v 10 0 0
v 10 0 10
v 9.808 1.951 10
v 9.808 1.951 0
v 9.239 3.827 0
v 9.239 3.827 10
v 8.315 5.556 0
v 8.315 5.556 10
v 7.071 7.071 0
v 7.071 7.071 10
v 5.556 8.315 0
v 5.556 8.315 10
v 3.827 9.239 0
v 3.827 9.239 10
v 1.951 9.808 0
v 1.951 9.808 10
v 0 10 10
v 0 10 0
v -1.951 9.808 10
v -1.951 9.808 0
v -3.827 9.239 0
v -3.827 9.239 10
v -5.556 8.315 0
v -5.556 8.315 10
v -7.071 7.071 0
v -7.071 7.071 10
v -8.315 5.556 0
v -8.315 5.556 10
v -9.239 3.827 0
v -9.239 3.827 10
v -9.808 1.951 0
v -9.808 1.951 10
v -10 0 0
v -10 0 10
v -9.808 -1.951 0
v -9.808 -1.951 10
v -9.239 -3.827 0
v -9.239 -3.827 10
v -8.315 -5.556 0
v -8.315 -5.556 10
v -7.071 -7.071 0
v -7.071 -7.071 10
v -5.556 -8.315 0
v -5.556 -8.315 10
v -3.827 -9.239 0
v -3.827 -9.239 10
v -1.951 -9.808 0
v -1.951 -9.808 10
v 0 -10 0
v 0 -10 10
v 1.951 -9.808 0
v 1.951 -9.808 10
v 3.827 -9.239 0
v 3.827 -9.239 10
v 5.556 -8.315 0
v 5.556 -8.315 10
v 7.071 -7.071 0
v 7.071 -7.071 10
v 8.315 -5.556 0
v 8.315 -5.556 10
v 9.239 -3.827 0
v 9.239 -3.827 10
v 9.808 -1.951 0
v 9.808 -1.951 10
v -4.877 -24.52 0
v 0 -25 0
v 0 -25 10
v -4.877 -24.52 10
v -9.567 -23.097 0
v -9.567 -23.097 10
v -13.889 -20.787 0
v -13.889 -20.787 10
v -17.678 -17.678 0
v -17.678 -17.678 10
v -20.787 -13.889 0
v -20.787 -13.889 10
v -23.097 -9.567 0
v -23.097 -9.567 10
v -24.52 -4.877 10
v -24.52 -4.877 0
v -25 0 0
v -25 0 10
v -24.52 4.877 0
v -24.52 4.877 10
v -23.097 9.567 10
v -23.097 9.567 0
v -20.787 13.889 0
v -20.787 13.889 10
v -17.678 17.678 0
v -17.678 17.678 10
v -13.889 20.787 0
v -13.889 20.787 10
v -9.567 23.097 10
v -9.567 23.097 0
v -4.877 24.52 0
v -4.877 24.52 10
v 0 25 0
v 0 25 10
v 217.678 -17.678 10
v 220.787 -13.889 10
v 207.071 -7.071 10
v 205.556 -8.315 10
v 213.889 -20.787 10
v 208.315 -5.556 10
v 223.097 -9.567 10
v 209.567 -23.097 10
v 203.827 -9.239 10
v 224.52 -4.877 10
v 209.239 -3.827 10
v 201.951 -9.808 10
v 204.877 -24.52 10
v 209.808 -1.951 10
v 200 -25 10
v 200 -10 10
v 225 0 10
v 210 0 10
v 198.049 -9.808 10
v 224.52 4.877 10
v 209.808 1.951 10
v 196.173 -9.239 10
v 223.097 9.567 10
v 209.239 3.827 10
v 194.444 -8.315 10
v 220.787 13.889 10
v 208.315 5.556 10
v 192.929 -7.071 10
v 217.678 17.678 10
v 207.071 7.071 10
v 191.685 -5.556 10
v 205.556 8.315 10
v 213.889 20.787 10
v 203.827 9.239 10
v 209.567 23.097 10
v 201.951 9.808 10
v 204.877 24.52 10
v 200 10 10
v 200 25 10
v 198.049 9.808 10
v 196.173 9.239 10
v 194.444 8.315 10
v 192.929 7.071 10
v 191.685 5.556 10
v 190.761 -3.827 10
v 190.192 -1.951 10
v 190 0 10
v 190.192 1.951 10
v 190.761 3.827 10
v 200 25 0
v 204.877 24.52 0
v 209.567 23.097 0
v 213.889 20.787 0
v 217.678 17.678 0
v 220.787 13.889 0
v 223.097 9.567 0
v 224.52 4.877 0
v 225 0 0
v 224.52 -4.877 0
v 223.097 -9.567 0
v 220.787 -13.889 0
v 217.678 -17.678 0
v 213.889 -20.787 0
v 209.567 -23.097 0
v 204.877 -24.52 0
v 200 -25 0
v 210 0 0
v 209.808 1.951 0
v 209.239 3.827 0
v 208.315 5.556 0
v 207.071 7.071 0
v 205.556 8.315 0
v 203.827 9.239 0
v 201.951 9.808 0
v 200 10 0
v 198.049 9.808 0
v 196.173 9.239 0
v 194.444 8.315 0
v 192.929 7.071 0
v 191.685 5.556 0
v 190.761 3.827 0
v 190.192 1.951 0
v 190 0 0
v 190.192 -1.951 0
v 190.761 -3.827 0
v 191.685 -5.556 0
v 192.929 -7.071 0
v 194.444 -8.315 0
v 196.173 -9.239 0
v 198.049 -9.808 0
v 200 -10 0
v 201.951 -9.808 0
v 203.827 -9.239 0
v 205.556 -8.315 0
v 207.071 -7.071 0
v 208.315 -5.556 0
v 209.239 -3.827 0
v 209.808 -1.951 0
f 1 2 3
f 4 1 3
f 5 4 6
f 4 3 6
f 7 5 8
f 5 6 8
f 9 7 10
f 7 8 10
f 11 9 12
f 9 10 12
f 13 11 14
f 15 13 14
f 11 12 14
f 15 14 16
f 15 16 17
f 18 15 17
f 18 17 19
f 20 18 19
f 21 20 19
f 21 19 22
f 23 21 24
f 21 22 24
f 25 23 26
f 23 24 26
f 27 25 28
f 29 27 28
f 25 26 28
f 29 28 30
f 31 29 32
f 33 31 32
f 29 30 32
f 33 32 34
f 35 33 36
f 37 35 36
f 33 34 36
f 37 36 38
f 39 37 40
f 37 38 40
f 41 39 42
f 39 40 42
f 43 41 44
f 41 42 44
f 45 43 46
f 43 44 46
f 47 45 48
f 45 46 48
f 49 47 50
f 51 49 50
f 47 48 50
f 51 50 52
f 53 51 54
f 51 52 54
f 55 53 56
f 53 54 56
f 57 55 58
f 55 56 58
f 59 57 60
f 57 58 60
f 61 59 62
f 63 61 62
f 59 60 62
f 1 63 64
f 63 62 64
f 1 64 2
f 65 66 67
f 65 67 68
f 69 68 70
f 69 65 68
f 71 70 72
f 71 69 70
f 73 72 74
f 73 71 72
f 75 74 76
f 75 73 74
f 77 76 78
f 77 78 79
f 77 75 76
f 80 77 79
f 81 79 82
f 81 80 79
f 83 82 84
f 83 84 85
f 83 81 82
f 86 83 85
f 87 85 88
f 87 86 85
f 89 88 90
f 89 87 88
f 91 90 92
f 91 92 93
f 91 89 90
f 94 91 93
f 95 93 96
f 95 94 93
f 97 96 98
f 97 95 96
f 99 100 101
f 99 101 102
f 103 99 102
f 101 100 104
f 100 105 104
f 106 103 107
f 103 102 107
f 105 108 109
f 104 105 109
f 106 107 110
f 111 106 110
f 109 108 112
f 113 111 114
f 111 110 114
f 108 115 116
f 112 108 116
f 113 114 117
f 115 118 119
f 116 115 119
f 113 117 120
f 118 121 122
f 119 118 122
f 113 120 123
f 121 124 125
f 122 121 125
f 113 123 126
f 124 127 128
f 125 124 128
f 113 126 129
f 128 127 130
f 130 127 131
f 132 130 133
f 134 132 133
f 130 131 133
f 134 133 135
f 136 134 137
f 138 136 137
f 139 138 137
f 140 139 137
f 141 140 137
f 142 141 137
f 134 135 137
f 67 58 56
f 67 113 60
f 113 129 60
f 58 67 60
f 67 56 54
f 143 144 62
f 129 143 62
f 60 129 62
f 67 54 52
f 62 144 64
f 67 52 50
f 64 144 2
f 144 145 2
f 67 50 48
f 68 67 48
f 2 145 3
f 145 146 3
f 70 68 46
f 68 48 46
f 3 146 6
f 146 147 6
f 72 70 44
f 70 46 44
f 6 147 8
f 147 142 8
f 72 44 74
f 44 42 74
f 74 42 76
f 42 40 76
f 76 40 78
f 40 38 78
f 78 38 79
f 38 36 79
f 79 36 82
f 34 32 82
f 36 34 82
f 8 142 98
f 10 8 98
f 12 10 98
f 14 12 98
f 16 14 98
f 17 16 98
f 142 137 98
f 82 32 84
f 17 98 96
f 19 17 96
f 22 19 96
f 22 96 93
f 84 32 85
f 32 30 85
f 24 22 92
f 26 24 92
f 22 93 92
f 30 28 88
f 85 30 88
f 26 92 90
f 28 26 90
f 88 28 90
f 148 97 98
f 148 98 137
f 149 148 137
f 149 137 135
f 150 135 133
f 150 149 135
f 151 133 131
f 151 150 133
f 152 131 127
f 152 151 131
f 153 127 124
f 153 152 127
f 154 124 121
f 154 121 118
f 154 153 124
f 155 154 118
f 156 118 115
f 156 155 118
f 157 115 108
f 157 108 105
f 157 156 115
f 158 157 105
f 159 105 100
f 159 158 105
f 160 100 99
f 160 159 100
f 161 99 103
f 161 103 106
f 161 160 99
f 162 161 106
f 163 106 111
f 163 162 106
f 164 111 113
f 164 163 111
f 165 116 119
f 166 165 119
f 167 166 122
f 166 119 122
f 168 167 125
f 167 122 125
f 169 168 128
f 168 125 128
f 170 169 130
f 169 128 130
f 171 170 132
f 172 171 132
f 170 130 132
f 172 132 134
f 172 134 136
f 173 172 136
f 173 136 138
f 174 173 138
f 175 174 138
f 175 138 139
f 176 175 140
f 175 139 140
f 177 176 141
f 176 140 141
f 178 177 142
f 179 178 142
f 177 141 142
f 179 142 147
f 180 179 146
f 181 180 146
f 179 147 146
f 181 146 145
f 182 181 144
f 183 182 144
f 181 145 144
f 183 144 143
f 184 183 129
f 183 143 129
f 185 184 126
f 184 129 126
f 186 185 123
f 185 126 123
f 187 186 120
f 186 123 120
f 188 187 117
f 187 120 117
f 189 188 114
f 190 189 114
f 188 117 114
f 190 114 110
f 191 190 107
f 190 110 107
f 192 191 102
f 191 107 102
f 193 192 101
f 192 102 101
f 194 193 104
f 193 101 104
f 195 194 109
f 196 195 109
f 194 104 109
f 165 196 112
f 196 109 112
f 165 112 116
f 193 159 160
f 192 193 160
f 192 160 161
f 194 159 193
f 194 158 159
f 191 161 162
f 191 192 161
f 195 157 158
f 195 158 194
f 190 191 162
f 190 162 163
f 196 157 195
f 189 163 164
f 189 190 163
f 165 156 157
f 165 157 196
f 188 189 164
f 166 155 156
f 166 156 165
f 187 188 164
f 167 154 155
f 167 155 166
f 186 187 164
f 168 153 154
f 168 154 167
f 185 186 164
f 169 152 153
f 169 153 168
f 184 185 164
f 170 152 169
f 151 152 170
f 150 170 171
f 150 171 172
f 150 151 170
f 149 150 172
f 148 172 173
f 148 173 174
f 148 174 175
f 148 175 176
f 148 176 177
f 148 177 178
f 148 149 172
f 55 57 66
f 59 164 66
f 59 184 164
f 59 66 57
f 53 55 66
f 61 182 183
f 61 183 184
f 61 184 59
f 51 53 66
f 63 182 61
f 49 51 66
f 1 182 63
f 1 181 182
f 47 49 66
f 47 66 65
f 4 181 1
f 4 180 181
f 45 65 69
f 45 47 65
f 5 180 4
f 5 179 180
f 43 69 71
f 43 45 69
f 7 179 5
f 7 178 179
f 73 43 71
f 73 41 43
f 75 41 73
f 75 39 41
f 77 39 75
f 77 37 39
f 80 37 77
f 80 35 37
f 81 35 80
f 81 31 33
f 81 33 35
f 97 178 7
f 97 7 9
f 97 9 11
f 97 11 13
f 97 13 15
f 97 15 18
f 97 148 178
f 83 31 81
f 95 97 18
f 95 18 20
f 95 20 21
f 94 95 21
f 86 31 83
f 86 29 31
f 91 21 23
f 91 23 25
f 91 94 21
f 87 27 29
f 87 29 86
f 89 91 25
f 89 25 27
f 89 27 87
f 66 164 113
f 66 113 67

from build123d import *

# Parameters (mm, degrees)
EXTRUDE_2_DEPTH     = 10
SKETCH_2_R          = 10
CUT_EXTRUDE_2_DEPTH = 10


with BuildPart() as part:
    # Эскиз1 → Бобышка-Вытянуть2 (new body)
    with BuildSketch(Plane.XY):
        with BuildLine():
            Line((0, 25), (200, 25))
            ThreePointArc((200, 25), (225, 0), (200, -25))
            Line((200, -25), (0, -25))
            ThreePointArc((0, -25), (-25, 0), (0, 25))
        make_face()
    extrude(amount=EXTRUDE_2_DEPTH)

    # Эскиз2 → Вырез-Вытянуть2 (cut)
    with BuildSketch(Plane.XY.offset(10)):
        Circle(SKETCH_2_R)
        with Locations((200, 0)):
            Circle(SKETCH_2_R)
    extrude(amount=-CUT_EXTRUDE_2_DEPTH, mode=Mode.SUBTRACT)


solid = part.part
